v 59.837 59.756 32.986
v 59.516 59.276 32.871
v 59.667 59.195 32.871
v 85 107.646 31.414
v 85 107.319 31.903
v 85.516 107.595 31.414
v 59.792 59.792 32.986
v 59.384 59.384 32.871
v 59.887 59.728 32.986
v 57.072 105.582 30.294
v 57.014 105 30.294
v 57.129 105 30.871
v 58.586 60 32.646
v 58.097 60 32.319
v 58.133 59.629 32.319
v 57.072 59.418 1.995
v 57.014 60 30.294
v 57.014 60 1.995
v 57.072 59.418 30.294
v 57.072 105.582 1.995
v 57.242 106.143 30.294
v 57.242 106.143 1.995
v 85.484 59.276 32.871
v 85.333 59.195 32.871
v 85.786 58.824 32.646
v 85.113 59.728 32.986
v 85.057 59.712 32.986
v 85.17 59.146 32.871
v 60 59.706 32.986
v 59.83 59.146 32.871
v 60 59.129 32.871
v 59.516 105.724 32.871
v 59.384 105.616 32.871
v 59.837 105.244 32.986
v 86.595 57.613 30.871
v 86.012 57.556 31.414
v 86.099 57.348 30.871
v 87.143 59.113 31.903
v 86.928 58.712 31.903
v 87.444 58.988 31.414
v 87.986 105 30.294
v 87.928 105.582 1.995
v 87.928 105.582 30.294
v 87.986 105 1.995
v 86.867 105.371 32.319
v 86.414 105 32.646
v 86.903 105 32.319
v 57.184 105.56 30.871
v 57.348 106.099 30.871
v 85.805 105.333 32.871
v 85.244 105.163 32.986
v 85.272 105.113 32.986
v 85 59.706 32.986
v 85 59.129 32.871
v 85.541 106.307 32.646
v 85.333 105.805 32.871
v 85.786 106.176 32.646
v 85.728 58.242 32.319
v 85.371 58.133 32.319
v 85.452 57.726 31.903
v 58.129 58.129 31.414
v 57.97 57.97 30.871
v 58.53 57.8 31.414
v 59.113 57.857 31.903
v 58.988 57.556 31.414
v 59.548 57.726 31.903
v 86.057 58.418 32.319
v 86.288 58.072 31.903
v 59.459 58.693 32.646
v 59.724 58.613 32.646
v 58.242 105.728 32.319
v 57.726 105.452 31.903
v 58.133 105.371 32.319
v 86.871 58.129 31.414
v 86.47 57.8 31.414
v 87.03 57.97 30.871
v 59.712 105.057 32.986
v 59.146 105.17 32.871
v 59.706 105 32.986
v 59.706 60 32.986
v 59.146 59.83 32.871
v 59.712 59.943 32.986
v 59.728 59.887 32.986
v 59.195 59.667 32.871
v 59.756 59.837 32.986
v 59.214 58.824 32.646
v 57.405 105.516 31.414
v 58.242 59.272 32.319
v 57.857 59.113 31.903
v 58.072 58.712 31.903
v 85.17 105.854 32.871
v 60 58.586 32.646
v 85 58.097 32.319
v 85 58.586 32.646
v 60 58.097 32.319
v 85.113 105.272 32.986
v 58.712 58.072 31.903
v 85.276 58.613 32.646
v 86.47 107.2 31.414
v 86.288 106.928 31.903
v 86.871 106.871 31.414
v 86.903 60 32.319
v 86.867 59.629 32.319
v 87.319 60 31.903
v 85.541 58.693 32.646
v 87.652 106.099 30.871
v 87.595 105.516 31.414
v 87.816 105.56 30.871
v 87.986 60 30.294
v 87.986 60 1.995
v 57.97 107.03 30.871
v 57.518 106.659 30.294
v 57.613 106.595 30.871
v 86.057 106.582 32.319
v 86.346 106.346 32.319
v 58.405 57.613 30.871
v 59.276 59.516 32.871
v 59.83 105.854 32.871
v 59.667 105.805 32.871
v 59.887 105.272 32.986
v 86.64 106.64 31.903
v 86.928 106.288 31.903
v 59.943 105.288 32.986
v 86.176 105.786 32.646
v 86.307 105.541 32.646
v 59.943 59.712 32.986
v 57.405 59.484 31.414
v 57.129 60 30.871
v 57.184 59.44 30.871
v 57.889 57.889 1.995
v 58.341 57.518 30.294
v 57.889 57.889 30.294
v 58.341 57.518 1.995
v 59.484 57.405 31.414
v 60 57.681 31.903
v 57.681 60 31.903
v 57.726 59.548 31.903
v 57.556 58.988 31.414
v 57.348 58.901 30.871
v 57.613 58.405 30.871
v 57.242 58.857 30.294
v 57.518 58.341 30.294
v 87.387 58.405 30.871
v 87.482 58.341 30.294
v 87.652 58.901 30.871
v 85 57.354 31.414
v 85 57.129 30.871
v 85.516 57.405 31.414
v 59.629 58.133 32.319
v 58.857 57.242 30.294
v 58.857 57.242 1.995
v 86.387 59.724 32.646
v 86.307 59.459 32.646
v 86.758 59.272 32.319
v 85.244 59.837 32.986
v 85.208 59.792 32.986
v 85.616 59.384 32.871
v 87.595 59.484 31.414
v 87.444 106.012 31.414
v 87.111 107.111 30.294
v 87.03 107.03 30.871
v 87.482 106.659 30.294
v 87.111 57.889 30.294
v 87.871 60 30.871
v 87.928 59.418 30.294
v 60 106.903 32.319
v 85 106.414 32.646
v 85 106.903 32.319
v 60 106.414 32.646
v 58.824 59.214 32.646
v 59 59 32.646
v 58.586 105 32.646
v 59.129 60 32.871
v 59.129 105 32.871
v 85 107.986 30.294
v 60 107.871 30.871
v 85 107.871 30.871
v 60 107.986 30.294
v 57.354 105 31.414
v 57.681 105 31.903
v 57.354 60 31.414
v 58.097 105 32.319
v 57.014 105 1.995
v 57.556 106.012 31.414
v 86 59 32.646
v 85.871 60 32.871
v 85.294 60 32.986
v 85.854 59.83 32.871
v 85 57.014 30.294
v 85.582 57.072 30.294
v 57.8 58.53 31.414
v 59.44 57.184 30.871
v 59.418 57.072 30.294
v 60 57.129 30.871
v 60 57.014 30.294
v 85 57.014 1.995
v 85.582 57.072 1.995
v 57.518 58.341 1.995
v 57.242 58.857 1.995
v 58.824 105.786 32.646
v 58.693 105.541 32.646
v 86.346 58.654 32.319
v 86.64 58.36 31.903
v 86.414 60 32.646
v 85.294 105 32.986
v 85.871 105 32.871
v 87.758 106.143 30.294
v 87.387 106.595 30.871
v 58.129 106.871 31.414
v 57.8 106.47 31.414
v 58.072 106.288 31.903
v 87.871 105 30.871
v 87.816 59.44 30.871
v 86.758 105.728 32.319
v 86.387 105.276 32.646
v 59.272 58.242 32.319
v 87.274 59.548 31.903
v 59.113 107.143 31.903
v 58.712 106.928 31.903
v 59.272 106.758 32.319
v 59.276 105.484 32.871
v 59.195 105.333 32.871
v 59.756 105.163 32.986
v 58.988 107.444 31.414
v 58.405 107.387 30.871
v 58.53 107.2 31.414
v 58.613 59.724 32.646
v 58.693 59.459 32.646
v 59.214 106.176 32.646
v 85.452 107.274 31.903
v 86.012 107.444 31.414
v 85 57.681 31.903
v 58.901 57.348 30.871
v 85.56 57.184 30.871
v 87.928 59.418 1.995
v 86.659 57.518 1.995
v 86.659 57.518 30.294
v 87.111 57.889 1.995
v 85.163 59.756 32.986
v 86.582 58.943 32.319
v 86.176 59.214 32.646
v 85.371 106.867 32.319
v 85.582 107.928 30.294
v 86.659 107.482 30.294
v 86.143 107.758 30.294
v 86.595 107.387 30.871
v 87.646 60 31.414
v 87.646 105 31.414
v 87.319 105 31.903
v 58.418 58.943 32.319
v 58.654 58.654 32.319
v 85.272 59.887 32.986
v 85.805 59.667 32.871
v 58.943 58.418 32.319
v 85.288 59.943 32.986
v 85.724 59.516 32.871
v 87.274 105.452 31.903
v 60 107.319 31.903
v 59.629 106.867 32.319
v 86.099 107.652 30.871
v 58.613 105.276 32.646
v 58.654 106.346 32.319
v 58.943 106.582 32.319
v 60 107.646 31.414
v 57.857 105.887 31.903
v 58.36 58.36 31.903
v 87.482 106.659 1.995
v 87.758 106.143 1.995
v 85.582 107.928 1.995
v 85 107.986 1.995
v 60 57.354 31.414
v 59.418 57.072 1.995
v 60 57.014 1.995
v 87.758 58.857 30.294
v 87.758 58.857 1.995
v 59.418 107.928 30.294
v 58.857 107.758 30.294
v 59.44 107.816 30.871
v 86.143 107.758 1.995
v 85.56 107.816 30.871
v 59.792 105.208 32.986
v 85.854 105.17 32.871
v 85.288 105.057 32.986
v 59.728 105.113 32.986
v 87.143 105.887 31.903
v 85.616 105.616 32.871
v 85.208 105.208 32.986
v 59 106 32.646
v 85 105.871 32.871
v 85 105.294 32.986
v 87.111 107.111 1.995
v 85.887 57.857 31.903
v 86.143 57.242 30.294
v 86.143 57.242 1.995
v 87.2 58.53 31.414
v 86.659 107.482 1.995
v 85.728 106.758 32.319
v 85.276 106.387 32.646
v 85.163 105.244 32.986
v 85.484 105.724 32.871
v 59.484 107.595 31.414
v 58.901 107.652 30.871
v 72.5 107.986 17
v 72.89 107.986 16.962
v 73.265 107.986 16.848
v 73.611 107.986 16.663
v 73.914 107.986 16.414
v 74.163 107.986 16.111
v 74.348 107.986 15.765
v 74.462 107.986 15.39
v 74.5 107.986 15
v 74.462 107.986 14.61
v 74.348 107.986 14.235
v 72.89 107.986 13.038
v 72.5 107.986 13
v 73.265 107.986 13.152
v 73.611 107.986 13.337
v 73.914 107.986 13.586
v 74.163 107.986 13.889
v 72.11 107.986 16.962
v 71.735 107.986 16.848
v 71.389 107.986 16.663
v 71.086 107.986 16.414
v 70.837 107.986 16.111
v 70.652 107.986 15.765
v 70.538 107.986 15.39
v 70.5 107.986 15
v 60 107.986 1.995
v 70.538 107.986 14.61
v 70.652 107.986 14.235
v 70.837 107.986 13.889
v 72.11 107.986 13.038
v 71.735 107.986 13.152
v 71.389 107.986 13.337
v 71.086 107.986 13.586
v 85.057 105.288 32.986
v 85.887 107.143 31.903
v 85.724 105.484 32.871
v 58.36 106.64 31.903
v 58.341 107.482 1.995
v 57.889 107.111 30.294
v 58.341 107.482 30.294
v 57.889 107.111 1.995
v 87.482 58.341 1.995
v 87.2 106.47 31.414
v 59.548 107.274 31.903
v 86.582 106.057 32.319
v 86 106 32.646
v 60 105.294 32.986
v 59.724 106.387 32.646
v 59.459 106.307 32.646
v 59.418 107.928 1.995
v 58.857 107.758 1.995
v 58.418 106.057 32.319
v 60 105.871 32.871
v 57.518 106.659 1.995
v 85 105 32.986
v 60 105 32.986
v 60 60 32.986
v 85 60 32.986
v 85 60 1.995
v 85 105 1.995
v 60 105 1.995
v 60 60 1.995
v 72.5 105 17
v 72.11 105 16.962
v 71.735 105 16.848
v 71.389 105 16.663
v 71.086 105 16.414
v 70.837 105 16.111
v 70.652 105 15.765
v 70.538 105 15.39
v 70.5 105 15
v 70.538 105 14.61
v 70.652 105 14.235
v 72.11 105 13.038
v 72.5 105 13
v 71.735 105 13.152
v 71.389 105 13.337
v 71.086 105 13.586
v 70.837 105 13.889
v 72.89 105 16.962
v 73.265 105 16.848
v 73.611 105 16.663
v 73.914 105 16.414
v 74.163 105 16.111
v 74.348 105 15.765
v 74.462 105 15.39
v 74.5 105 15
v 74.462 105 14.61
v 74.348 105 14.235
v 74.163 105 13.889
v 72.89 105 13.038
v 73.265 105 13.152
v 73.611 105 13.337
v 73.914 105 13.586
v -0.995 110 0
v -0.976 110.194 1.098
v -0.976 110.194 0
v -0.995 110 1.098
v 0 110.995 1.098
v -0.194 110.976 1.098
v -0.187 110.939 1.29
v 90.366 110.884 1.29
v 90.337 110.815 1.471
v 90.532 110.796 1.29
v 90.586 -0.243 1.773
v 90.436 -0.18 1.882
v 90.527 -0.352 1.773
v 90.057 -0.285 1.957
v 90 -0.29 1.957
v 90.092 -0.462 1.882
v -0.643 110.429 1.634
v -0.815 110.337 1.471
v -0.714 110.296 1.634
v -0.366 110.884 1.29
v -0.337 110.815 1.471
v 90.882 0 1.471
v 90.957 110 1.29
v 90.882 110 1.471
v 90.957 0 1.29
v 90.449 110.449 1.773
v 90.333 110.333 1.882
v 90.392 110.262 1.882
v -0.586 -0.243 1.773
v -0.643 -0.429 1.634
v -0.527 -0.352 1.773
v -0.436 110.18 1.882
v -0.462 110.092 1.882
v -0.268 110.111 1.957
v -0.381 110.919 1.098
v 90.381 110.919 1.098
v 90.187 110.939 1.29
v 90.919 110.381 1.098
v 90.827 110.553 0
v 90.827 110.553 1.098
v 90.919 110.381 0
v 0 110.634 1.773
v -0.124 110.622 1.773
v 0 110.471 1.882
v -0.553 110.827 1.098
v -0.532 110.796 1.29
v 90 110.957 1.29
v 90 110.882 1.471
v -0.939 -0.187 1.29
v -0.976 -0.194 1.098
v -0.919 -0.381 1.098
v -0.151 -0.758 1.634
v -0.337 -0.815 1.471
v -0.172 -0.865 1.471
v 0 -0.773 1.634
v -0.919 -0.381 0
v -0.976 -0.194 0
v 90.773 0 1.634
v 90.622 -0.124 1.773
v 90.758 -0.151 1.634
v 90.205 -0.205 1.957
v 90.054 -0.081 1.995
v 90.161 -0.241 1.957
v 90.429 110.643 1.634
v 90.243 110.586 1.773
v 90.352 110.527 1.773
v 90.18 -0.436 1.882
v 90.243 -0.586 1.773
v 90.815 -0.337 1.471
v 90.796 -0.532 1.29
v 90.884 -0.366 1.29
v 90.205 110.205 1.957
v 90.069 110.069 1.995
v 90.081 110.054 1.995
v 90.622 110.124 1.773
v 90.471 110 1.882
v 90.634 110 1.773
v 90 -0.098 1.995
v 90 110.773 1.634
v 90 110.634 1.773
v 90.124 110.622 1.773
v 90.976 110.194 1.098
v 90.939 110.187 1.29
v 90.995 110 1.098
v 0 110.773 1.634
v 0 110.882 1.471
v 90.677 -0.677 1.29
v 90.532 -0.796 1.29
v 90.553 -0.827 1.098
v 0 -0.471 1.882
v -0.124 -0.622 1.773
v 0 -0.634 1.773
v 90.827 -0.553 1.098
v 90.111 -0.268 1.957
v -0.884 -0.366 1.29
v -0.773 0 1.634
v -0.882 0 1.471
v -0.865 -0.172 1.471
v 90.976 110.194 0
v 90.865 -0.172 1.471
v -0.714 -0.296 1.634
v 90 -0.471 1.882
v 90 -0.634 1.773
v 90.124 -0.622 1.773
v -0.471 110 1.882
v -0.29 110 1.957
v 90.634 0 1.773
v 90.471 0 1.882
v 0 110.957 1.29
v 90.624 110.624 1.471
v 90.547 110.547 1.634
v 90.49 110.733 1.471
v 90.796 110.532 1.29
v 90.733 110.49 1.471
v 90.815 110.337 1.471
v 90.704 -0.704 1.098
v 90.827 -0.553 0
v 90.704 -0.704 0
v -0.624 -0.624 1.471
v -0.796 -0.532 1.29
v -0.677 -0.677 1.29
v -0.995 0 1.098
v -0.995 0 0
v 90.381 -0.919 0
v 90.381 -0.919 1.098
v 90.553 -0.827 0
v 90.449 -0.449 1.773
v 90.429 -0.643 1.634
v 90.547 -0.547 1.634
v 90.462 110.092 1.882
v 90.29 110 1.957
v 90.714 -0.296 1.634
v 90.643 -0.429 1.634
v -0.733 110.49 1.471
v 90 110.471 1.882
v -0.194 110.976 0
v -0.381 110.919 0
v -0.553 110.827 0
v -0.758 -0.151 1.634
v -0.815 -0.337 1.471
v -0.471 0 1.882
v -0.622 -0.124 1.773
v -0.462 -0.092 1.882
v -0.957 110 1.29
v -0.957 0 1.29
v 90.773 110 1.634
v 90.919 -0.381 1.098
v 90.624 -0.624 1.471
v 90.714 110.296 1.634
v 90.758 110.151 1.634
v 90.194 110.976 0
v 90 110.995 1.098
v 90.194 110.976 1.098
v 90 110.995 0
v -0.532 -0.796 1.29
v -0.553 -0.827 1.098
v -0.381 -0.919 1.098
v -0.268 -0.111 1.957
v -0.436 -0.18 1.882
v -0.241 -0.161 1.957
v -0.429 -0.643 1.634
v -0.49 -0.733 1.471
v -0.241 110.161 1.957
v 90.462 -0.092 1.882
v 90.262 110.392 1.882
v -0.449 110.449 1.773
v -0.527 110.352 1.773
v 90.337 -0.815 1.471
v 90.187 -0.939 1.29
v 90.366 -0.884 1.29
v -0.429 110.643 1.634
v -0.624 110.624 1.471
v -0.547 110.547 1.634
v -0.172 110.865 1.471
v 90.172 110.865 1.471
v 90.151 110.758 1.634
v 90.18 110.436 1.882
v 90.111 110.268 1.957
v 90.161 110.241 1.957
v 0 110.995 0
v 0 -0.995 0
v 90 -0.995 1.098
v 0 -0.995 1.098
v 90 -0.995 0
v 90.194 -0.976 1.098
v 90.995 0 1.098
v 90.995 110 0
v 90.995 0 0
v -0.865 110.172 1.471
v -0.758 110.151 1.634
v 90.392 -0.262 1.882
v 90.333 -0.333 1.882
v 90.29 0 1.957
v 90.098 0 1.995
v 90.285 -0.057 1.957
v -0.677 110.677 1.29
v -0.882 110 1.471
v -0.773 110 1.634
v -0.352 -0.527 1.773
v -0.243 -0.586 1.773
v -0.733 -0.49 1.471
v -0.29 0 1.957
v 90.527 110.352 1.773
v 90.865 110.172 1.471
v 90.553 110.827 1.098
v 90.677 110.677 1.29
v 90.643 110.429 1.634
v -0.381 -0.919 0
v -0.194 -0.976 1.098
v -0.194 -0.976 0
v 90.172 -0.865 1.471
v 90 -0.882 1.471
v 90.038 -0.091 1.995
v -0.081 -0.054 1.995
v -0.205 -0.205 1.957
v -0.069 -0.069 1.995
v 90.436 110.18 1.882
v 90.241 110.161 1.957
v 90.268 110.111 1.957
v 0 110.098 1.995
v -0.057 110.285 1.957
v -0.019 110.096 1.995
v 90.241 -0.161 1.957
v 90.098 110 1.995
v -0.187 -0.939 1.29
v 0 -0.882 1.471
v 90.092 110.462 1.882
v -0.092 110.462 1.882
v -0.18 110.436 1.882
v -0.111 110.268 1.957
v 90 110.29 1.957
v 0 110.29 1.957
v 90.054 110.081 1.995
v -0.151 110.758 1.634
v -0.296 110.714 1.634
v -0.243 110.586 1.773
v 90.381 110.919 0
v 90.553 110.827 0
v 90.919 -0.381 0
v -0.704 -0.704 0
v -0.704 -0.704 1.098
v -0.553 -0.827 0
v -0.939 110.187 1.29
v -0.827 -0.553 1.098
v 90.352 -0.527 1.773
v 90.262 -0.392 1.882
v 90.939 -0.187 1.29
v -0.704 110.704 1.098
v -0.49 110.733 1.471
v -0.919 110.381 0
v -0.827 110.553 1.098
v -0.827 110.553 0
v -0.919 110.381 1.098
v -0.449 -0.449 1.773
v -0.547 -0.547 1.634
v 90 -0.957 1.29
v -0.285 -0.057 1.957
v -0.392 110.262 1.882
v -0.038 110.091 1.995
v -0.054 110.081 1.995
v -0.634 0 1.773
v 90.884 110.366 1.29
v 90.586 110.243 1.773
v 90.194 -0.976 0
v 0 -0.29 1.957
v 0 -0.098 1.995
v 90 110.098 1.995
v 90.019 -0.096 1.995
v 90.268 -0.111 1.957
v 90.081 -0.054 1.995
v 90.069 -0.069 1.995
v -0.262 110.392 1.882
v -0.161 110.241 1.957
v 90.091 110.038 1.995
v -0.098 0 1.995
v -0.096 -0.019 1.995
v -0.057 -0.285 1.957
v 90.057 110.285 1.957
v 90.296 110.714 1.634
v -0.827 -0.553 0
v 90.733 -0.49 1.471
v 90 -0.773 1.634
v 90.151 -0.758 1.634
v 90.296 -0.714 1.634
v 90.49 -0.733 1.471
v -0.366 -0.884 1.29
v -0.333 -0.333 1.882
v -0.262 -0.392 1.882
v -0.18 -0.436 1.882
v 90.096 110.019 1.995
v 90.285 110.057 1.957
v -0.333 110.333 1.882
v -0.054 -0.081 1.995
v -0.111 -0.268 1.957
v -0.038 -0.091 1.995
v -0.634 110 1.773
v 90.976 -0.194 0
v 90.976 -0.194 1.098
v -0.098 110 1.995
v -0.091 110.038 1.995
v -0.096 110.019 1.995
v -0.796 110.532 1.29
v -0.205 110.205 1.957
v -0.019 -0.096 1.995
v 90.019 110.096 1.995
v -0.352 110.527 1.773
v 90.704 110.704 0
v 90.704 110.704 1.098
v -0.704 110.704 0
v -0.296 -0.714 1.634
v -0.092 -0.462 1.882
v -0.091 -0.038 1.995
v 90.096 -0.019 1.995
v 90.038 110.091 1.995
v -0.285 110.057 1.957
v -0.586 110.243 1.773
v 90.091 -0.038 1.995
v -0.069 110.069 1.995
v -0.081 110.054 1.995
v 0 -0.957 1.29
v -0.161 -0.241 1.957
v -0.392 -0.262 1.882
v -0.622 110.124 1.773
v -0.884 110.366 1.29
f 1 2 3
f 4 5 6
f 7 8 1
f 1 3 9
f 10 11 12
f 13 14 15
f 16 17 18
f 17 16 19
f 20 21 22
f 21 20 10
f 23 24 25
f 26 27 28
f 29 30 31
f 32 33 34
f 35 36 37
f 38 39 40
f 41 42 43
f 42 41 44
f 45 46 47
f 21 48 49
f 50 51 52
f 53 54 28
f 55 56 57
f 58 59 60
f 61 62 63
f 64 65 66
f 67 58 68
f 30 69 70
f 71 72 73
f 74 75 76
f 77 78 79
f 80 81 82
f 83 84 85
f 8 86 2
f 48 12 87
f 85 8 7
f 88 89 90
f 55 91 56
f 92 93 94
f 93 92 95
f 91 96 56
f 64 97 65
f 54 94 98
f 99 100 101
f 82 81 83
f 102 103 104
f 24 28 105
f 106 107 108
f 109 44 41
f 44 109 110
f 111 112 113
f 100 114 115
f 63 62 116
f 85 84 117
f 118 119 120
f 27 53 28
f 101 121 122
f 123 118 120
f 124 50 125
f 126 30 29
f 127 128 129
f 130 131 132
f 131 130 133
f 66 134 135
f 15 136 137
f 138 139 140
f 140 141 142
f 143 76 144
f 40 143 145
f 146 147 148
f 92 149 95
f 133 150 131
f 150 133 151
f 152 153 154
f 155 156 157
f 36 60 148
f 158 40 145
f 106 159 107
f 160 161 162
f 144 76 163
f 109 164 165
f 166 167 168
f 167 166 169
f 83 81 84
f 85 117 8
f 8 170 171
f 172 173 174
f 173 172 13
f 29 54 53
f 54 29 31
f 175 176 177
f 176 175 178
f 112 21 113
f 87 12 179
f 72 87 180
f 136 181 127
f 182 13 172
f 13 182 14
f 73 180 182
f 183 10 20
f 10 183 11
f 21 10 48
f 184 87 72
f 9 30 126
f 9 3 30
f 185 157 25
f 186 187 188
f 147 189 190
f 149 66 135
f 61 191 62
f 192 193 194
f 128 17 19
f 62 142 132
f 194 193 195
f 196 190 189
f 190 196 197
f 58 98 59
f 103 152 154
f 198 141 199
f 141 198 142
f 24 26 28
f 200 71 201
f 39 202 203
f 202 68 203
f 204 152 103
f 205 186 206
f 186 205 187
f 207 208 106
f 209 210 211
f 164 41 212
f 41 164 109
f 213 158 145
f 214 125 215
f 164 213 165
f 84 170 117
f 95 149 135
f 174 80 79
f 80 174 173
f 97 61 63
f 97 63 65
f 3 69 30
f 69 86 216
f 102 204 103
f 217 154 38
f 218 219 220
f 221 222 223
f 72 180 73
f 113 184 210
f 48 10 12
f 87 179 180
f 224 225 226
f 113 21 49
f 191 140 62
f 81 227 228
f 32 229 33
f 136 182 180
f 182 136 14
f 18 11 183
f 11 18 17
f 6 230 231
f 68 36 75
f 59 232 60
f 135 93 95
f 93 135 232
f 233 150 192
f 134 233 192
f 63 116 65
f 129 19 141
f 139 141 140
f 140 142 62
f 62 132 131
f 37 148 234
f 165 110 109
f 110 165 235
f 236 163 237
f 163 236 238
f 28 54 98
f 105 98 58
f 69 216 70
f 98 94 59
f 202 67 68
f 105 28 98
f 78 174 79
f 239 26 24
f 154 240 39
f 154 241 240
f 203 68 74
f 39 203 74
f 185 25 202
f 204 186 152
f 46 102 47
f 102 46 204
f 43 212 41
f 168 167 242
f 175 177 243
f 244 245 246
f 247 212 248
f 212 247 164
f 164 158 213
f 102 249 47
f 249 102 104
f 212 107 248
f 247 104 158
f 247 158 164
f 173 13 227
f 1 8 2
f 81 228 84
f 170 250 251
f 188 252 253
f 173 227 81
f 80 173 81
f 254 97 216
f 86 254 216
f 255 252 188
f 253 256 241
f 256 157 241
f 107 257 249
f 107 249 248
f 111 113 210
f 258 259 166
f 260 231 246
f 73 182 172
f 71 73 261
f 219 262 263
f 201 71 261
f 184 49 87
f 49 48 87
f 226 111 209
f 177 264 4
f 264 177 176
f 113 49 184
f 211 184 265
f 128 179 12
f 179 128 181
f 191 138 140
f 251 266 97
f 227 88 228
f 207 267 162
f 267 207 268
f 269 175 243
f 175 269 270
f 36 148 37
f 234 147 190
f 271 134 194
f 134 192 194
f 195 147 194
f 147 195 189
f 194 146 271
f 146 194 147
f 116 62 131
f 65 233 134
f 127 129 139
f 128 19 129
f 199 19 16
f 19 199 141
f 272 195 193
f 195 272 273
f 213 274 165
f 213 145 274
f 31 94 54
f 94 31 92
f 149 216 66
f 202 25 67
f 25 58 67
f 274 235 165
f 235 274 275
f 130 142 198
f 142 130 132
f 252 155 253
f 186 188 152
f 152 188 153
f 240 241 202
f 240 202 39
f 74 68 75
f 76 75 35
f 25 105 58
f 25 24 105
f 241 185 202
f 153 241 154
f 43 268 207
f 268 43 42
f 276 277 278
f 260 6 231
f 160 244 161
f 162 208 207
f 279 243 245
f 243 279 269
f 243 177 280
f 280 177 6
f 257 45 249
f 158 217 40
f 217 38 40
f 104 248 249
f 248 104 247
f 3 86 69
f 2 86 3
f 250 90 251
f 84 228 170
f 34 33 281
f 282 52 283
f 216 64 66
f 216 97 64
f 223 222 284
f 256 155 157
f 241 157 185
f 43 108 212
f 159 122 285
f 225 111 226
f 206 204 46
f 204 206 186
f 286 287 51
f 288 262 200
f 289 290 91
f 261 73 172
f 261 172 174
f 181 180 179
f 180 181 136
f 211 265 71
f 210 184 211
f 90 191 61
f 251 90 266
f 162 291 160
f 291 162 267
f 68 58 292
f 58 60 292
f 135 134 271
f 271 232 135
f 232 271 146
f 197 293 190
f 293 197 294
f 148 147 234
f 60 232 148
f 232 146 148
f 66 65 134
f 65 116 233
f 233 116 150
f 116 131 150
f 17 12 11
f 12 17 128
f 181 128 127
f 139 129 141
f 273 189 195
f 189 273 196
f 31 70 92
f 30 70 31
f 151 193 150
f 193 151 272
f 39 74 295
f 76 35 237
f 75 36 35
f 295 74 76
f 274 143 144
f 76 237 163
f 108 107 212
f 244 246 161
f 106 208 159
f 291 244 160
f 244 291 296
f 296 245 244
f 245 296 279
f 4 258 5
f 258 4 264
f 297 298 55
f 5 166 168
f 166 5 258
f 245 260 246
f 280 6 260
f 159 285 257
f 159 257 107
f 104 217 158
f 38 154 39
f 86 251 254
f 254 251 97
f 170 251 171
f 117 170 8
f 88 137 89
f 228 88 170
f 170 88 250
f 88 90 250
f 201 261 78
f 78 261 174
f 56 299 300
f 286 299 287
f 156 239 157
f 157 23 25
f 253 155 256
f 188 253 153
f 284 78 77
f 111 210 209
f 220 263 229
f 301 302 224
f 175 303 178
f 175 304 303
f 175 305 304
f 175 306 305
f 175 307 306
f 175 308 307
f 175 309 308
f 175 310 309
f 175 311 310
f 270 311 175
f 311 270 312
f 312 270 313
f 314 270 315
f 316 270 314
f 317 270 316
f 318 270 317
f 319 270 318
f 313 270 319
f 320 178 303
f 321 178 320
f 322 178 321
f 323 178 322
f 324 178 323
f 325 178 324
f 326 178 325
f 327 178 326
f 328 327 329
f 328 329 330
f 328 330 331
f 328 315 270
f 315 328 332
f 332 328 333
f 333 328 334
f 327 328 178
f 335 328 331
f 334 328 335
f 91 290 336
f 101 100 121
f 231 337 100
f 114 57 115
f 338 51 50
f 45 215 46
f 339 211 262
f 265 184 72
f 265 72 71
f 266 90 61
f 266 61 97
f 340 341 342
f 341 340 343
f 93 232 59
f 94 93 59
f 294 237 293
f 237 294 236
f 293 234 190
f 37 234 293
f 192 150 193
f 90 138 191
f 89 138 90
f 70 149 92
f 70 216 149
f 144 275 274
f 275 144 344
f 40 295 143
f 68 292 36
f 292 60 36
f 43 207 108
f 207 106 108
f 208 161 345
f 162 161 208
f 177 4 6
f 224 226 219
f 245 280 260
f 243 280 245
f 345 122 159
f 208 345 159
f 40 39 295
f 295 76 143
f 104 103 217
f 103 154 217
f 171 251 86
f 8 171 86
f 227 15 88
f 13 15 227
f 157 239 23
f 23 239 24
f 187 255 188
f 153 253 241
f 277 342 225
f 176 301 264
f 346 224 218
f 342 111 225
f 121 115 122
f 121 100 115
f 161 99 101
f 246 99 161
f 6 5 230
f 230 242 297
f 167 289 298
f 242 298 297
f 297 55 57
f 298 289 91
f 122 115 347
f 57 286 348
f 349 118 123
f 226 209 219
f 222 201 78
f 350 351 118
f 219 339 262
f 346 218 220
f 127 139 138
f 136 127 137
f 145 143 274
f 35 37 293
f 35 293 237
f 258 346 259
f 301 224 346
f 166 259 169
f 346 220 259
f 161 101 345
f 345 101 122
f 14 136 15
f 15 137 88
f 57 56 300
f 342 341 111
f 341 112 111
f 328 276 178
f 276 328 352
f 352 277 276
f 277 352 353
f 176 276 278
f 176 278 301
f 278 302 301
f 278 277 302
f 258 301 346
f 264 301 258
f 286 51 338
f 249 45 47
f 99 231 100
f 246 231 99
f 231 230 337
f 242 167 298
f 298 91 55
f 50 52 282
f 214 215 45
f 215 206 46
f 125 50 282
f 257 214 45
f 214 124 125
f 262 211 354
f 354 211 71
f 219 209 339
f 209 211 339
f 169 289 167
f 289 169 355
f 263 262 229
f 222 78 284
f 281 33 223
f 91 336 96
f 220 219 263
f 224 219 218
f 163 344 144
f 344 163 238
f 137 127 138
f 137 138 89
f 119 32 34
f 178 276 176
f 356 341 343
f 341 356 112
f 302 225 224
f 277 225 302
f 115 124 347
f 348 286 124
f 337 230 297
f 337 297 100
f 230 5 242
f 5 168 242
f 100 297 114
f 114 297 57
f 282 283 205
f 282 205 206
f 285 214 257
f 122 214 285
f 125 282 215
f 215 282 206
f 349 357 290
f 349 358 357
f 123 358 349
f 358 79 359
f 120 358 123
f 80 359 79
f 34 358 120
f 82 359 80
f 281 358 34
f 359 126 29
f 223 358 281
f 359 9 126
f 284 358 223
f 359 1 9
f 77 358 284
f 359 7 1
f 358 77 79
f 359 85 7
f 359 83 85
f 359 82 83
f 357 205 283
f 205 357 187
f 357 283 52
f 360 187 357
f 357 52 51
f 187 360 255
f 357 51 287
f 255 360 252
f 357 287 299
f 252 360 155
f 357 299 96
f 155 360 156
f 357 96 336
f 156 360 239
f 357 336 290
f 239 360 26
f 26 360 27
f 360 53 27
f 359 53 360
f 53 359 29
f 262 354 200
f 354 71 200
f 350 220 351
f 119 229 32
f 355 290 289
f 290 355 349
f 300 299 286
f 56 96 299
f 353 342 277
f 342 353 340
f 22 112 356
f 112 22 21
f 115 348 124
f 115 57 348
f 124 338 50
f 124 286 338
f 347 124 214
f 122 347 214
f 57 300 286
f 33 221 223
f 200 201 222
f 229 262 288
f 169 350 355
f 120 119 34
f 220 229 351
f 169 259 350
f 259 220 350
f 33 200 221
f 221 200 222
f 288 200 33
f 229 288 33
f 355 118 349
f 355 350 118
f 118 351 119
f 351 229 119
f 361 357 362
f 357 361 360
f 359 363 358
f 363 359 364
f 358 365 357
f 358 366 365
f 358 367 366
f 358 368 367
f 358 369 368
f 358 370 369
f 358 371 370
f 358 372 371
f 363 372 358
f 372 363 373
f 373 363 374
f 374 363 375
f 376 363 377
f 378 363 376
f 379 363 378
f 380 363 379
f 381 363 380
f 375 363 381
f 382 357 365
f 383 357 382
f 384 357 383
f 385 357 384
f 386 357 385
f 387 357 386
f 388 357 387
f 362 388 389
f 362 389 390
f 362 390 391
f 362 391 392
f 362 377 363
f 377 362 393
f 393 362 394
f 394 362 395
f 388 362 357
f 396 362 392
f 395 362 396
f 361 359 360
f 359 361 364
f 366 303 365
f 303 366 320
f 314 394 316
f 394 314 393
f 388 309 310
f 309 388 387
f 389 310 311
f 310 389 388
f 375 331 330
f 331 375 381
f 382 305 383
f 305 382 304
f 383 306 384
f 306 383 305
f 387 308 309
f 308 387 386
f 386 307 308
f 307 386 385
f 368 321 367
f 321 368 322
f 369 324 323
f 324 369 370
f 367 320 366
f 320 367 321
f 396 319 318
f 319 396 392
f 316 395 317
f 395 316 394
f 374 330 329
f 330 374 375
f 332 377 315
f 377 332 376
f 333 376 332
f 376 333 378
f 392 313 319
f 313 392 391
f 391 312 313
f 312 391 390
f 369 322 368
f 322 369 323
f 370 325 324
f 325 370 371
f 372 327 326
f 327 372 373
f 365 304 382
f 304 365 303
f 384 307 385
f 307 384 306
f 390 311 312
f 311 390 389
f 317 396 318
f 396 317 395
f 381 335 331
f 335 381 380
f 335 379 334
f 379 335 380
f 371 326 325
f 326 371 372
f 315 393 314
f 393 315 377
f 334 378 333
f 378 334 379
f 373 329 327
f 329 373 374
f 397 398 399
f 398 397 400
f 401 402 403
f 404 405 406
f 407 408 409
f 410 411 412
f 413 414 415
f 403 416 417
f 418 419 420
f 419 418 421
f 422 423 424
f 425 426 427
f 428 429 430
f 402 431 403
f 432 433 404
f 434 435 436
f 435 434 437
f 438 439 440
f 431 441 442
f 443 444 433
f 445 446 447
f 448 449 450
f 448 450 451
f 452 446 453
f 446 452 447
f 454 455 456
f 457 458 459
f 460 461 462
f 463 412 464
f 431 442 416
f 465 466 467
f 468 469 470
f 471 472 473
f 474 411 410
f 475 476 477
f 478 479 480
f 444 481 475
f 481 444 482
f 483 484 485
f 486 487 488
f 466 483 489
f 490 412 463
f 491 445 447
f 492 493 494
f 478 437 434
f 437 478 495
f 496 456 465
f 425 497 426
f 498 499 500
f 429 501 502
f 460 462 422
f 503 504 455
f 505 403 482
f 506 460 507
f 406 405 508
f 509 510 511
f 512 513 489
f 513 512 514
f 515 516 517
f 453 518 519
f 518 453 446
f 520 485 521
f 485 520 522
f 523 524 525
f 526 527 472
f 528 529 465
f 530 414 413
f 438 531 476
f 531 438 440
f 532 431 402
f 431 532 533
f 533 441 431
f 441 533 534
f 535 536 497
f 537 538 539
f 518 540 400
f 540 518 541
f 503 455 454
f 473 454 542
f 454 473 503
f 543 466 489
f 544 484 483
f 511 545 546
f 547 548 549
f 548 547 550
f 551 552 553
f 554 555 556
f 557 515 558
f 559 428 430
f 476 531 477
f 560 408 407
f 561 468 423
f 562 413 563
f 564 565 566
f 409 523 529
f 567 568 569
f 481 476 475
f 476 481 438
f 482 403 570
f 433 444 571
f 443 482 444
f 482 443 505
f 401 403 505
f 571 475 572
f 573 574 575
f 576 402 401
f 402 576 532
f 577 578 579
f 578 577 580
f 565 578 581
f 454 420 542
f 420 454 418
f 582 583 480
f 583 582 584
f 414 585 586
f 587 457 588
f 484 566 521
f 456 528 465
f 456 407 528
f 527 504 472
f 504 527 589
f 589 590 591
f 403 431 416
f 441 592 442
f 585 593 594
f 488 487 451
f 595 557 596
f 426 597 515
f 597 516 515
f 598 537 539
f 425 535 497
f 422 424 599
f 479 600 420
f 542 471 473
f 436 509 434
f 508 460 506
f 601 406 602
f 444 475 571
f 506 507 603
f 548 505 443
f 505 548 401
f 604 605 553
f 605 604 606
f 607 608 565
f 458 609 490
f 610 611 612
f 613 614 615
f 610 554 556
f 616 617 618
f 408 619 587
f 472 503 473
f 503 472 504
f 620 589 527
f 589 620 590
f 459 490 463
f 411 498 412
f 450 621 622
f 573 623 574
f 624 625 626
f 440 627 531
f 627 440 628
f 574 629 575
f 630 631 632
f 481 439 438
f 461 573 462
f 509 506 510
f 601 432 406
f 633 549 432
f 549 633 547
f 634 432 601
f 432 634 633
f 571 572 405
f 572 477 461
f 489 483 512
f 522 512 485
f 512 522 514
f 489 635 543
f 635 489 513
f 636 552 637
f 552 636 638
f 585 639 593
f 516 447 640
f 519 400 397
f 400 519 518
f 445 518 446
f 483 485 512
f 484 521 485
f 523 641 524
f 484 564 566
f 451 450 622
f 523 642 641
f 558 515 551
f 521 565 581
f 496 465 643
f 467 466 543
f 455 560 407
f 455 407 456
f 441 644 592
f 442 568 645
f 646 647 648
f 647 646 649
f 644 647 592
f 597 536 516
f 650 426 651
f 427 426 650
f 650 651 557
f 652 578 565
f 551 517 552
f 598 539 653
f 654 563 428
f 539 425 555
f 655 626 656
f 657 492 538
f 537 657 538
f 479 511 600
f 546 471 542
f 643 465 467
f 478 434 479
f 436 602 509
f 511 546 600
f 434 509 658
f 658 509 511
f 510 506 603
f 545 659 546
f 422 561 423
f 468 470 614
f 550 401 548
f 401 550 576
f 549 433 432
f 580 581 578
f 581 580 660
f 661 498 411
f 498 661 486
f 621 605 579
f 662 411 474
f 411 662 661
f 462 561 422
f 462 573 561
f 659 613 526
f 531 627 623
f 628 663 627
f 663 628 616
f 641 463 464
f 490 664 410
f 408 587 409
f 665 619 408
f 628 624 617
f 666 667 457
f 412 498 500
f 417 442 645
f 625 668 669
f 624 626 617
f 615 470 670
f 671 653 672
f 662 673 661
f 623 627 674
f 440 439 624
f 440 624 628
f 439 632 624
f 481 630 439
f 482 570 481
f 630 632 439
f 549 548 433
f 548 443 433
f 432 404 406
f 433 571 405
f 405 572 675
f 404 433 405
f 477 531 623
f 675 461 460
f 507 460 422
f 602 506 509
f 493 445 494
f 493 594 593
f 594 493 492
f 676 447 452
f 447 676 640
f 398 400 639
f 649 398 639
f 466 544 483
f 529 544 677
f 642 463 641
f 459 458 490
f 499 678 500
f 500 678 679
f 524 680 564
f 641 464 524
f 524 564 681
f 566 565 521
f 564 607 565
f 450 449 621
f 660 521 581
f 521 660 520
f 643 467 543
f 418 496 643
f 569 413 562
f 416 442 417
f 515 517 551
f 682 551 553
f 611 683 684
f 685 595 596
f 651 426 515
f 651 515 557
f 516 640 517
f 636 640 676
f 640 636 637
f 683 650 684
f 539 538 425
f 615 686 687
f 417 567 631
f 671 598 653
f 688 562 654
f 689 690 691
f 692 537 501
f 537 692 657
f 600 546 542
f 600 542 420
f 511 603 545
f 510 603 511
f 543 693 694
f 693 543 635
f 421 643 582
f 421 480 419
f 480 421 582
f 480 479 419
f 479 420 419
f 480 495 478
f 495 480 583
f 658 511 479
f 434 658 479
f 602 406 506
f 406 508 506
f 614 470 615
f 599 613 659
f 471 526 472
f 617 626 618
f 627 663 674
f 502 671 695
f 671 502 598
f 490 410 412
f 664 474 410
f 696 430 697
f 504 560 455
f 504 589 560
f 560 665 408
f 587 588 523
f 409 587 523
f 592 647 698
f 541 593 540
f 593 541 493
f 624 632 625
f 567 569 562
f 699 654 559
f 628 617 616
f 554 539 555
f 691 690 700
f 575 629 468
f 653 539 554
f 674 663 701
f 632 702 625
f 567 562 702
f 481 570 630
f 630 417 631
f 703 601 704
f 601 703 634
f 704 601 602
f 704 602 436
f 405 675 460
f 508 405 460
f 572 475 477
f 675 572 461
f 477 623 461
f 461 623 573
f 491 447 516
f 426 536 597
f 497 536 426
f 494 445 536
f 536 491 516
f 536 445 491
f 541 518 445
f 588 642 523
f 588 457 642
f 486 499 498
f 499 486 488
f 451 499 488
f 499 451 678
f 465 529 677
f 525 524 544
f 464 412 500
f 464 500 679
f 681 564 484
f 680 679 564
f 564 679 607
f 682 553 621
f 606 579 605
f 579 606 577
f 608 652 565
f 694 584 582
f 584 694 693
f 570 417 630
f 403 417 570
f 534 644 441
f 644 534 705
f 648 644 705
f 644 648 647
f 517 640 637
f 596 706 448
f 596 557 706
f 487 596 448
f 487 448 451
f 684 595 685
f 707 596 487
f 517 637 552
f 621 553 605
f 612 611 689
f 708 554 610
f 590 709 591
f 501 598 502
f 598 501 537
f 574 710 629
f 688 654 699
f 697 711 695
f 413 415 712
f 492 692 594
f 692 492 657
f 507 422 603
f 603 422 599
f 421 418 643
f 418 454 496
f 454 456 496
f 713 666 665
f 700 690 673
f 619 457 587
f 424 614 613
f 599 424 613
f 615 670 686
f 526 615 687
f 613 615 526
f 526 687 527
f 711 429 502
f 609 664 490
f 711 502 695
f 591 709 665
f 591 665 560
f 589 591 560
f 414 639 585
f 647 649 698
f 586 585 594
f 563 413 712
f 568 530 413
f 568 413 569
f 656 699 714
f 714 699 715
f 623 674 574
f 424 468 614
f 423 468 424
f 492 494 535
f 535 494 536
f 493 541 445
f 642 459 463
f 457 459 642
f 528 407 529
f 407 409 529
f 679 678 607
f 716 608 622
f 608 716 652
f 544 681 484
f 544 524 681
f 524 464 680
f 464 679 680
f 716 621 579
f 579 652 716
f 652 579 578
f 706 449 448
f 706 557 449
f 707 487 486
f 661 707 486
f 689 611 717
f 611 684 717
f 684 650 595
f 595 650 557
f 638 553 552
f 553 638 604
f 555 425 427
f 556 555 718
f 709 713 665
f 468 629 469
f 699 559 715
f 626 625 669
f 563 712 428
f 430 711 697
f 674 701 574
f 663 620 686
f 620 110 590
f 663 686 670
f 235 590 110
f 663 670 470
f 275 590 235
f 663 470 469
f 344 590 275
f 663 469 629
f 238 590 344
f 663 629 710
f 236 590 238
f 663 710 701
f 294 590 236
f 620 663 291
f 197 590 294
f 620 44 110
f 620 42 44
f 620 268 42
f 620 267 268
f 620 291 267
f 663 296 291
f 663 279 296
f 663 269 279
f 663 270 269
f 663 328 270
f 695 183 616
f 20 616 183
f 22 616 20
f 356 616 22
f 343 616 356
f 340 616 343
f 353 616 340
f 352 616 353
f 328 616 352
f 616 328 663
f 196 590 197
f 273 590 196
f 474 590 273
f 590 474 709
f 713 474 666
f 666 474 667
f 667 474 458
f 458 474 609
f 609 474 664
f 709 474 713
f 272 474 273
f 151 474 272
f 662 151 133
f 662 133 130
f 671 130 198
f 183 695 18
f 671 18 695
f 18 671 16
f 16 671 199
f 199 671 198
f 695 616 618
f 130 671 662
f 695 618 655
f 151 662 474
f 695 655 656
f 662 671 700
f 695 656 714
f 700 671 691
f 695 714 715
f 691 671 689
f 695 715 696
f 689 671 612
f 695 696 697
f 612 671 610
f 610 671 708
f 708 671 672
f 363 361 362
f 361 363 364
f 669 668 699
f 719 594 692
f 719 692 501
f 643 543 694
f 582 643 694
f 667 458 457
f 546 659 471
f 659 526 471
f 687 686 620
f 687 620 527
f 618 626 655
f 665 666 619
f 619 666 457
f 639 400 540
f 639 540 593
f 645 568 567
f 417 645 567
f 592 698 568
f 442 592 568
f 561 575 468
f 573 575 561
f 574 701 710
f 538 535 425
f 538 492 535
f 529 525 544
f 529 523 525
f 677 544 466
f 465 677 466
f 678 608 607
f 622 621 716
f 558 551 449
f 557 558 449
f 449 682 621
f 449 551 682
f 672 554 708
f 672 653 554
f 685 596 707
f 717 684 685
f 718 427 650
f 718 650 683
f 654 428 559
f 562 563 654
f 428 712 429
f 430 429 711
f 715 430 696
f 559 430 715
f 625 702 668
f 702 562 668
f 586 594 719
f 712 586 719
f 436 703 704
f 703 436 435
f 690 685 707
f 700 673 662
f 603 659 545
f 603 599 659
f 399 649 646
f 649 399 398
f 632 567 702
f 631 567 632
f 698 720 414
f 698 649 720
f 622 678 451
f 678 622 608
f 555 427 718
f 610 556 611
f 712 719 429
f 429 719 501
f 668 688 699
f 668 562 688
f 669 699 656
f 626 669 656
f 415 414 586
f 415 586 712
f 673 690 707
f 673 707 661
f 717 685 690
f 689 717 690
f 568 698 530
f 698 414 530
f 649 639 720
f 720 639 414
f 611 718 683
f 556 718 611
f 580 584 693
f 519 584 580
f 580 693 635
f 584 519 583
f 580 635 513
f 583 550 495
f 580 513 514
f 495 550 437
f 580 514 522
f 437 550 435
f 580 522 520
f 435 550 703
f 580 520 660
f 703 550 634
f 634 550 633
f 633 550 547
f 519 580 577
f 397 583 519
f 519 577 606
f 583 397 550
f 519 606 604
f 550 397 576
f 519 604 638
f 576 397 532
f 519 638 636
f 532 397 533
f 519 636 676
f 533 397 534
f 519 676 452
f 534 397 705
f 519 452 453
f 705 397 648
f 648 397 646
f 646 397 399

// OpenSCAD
//  Foot.scad    Fuß für Dosiergerät

beam_x = 25;
beam_y = 45;
beam_z = 30;
beam_wall = 3;

hole_dia = 4;

inset = 5;

foot_x = 90;
foot_y = 110;
foot_z = 3;
foot_edge_rad = 1;

$fn = 32;
eps = 0.05;

difference() {
    union() {

        translate([foot_x-beam_x-inset, foot_y-beam_y-inset, 0])
        difference() {
            minkowski() {
                cube([beam_x, beam_y, beam_z]);
                sphere(beam_wall);
            }
            scale([1,1,2])
                cube([beam_x, beam_y, beam_z]);
            translate([(beam_x+beam_wall*0)/2, (beam_y+beam_wall*2), beam_z/2])
                rotate([90,0,0])
                    cylinder(h=beam_wall*5, d=hole_dia);
        }
        
        // foot plate
        translate([0,0,-foot_edge_rad])
            minkowski() {
                cube([foot_x, foot_y, foot_z-foot_edge_rad]);
                sphere(foot_edge_rad);
            }
    }
    translate([-10,-10,-10])
        cube([foot_x+20, foot_y+20, 10]);
}
